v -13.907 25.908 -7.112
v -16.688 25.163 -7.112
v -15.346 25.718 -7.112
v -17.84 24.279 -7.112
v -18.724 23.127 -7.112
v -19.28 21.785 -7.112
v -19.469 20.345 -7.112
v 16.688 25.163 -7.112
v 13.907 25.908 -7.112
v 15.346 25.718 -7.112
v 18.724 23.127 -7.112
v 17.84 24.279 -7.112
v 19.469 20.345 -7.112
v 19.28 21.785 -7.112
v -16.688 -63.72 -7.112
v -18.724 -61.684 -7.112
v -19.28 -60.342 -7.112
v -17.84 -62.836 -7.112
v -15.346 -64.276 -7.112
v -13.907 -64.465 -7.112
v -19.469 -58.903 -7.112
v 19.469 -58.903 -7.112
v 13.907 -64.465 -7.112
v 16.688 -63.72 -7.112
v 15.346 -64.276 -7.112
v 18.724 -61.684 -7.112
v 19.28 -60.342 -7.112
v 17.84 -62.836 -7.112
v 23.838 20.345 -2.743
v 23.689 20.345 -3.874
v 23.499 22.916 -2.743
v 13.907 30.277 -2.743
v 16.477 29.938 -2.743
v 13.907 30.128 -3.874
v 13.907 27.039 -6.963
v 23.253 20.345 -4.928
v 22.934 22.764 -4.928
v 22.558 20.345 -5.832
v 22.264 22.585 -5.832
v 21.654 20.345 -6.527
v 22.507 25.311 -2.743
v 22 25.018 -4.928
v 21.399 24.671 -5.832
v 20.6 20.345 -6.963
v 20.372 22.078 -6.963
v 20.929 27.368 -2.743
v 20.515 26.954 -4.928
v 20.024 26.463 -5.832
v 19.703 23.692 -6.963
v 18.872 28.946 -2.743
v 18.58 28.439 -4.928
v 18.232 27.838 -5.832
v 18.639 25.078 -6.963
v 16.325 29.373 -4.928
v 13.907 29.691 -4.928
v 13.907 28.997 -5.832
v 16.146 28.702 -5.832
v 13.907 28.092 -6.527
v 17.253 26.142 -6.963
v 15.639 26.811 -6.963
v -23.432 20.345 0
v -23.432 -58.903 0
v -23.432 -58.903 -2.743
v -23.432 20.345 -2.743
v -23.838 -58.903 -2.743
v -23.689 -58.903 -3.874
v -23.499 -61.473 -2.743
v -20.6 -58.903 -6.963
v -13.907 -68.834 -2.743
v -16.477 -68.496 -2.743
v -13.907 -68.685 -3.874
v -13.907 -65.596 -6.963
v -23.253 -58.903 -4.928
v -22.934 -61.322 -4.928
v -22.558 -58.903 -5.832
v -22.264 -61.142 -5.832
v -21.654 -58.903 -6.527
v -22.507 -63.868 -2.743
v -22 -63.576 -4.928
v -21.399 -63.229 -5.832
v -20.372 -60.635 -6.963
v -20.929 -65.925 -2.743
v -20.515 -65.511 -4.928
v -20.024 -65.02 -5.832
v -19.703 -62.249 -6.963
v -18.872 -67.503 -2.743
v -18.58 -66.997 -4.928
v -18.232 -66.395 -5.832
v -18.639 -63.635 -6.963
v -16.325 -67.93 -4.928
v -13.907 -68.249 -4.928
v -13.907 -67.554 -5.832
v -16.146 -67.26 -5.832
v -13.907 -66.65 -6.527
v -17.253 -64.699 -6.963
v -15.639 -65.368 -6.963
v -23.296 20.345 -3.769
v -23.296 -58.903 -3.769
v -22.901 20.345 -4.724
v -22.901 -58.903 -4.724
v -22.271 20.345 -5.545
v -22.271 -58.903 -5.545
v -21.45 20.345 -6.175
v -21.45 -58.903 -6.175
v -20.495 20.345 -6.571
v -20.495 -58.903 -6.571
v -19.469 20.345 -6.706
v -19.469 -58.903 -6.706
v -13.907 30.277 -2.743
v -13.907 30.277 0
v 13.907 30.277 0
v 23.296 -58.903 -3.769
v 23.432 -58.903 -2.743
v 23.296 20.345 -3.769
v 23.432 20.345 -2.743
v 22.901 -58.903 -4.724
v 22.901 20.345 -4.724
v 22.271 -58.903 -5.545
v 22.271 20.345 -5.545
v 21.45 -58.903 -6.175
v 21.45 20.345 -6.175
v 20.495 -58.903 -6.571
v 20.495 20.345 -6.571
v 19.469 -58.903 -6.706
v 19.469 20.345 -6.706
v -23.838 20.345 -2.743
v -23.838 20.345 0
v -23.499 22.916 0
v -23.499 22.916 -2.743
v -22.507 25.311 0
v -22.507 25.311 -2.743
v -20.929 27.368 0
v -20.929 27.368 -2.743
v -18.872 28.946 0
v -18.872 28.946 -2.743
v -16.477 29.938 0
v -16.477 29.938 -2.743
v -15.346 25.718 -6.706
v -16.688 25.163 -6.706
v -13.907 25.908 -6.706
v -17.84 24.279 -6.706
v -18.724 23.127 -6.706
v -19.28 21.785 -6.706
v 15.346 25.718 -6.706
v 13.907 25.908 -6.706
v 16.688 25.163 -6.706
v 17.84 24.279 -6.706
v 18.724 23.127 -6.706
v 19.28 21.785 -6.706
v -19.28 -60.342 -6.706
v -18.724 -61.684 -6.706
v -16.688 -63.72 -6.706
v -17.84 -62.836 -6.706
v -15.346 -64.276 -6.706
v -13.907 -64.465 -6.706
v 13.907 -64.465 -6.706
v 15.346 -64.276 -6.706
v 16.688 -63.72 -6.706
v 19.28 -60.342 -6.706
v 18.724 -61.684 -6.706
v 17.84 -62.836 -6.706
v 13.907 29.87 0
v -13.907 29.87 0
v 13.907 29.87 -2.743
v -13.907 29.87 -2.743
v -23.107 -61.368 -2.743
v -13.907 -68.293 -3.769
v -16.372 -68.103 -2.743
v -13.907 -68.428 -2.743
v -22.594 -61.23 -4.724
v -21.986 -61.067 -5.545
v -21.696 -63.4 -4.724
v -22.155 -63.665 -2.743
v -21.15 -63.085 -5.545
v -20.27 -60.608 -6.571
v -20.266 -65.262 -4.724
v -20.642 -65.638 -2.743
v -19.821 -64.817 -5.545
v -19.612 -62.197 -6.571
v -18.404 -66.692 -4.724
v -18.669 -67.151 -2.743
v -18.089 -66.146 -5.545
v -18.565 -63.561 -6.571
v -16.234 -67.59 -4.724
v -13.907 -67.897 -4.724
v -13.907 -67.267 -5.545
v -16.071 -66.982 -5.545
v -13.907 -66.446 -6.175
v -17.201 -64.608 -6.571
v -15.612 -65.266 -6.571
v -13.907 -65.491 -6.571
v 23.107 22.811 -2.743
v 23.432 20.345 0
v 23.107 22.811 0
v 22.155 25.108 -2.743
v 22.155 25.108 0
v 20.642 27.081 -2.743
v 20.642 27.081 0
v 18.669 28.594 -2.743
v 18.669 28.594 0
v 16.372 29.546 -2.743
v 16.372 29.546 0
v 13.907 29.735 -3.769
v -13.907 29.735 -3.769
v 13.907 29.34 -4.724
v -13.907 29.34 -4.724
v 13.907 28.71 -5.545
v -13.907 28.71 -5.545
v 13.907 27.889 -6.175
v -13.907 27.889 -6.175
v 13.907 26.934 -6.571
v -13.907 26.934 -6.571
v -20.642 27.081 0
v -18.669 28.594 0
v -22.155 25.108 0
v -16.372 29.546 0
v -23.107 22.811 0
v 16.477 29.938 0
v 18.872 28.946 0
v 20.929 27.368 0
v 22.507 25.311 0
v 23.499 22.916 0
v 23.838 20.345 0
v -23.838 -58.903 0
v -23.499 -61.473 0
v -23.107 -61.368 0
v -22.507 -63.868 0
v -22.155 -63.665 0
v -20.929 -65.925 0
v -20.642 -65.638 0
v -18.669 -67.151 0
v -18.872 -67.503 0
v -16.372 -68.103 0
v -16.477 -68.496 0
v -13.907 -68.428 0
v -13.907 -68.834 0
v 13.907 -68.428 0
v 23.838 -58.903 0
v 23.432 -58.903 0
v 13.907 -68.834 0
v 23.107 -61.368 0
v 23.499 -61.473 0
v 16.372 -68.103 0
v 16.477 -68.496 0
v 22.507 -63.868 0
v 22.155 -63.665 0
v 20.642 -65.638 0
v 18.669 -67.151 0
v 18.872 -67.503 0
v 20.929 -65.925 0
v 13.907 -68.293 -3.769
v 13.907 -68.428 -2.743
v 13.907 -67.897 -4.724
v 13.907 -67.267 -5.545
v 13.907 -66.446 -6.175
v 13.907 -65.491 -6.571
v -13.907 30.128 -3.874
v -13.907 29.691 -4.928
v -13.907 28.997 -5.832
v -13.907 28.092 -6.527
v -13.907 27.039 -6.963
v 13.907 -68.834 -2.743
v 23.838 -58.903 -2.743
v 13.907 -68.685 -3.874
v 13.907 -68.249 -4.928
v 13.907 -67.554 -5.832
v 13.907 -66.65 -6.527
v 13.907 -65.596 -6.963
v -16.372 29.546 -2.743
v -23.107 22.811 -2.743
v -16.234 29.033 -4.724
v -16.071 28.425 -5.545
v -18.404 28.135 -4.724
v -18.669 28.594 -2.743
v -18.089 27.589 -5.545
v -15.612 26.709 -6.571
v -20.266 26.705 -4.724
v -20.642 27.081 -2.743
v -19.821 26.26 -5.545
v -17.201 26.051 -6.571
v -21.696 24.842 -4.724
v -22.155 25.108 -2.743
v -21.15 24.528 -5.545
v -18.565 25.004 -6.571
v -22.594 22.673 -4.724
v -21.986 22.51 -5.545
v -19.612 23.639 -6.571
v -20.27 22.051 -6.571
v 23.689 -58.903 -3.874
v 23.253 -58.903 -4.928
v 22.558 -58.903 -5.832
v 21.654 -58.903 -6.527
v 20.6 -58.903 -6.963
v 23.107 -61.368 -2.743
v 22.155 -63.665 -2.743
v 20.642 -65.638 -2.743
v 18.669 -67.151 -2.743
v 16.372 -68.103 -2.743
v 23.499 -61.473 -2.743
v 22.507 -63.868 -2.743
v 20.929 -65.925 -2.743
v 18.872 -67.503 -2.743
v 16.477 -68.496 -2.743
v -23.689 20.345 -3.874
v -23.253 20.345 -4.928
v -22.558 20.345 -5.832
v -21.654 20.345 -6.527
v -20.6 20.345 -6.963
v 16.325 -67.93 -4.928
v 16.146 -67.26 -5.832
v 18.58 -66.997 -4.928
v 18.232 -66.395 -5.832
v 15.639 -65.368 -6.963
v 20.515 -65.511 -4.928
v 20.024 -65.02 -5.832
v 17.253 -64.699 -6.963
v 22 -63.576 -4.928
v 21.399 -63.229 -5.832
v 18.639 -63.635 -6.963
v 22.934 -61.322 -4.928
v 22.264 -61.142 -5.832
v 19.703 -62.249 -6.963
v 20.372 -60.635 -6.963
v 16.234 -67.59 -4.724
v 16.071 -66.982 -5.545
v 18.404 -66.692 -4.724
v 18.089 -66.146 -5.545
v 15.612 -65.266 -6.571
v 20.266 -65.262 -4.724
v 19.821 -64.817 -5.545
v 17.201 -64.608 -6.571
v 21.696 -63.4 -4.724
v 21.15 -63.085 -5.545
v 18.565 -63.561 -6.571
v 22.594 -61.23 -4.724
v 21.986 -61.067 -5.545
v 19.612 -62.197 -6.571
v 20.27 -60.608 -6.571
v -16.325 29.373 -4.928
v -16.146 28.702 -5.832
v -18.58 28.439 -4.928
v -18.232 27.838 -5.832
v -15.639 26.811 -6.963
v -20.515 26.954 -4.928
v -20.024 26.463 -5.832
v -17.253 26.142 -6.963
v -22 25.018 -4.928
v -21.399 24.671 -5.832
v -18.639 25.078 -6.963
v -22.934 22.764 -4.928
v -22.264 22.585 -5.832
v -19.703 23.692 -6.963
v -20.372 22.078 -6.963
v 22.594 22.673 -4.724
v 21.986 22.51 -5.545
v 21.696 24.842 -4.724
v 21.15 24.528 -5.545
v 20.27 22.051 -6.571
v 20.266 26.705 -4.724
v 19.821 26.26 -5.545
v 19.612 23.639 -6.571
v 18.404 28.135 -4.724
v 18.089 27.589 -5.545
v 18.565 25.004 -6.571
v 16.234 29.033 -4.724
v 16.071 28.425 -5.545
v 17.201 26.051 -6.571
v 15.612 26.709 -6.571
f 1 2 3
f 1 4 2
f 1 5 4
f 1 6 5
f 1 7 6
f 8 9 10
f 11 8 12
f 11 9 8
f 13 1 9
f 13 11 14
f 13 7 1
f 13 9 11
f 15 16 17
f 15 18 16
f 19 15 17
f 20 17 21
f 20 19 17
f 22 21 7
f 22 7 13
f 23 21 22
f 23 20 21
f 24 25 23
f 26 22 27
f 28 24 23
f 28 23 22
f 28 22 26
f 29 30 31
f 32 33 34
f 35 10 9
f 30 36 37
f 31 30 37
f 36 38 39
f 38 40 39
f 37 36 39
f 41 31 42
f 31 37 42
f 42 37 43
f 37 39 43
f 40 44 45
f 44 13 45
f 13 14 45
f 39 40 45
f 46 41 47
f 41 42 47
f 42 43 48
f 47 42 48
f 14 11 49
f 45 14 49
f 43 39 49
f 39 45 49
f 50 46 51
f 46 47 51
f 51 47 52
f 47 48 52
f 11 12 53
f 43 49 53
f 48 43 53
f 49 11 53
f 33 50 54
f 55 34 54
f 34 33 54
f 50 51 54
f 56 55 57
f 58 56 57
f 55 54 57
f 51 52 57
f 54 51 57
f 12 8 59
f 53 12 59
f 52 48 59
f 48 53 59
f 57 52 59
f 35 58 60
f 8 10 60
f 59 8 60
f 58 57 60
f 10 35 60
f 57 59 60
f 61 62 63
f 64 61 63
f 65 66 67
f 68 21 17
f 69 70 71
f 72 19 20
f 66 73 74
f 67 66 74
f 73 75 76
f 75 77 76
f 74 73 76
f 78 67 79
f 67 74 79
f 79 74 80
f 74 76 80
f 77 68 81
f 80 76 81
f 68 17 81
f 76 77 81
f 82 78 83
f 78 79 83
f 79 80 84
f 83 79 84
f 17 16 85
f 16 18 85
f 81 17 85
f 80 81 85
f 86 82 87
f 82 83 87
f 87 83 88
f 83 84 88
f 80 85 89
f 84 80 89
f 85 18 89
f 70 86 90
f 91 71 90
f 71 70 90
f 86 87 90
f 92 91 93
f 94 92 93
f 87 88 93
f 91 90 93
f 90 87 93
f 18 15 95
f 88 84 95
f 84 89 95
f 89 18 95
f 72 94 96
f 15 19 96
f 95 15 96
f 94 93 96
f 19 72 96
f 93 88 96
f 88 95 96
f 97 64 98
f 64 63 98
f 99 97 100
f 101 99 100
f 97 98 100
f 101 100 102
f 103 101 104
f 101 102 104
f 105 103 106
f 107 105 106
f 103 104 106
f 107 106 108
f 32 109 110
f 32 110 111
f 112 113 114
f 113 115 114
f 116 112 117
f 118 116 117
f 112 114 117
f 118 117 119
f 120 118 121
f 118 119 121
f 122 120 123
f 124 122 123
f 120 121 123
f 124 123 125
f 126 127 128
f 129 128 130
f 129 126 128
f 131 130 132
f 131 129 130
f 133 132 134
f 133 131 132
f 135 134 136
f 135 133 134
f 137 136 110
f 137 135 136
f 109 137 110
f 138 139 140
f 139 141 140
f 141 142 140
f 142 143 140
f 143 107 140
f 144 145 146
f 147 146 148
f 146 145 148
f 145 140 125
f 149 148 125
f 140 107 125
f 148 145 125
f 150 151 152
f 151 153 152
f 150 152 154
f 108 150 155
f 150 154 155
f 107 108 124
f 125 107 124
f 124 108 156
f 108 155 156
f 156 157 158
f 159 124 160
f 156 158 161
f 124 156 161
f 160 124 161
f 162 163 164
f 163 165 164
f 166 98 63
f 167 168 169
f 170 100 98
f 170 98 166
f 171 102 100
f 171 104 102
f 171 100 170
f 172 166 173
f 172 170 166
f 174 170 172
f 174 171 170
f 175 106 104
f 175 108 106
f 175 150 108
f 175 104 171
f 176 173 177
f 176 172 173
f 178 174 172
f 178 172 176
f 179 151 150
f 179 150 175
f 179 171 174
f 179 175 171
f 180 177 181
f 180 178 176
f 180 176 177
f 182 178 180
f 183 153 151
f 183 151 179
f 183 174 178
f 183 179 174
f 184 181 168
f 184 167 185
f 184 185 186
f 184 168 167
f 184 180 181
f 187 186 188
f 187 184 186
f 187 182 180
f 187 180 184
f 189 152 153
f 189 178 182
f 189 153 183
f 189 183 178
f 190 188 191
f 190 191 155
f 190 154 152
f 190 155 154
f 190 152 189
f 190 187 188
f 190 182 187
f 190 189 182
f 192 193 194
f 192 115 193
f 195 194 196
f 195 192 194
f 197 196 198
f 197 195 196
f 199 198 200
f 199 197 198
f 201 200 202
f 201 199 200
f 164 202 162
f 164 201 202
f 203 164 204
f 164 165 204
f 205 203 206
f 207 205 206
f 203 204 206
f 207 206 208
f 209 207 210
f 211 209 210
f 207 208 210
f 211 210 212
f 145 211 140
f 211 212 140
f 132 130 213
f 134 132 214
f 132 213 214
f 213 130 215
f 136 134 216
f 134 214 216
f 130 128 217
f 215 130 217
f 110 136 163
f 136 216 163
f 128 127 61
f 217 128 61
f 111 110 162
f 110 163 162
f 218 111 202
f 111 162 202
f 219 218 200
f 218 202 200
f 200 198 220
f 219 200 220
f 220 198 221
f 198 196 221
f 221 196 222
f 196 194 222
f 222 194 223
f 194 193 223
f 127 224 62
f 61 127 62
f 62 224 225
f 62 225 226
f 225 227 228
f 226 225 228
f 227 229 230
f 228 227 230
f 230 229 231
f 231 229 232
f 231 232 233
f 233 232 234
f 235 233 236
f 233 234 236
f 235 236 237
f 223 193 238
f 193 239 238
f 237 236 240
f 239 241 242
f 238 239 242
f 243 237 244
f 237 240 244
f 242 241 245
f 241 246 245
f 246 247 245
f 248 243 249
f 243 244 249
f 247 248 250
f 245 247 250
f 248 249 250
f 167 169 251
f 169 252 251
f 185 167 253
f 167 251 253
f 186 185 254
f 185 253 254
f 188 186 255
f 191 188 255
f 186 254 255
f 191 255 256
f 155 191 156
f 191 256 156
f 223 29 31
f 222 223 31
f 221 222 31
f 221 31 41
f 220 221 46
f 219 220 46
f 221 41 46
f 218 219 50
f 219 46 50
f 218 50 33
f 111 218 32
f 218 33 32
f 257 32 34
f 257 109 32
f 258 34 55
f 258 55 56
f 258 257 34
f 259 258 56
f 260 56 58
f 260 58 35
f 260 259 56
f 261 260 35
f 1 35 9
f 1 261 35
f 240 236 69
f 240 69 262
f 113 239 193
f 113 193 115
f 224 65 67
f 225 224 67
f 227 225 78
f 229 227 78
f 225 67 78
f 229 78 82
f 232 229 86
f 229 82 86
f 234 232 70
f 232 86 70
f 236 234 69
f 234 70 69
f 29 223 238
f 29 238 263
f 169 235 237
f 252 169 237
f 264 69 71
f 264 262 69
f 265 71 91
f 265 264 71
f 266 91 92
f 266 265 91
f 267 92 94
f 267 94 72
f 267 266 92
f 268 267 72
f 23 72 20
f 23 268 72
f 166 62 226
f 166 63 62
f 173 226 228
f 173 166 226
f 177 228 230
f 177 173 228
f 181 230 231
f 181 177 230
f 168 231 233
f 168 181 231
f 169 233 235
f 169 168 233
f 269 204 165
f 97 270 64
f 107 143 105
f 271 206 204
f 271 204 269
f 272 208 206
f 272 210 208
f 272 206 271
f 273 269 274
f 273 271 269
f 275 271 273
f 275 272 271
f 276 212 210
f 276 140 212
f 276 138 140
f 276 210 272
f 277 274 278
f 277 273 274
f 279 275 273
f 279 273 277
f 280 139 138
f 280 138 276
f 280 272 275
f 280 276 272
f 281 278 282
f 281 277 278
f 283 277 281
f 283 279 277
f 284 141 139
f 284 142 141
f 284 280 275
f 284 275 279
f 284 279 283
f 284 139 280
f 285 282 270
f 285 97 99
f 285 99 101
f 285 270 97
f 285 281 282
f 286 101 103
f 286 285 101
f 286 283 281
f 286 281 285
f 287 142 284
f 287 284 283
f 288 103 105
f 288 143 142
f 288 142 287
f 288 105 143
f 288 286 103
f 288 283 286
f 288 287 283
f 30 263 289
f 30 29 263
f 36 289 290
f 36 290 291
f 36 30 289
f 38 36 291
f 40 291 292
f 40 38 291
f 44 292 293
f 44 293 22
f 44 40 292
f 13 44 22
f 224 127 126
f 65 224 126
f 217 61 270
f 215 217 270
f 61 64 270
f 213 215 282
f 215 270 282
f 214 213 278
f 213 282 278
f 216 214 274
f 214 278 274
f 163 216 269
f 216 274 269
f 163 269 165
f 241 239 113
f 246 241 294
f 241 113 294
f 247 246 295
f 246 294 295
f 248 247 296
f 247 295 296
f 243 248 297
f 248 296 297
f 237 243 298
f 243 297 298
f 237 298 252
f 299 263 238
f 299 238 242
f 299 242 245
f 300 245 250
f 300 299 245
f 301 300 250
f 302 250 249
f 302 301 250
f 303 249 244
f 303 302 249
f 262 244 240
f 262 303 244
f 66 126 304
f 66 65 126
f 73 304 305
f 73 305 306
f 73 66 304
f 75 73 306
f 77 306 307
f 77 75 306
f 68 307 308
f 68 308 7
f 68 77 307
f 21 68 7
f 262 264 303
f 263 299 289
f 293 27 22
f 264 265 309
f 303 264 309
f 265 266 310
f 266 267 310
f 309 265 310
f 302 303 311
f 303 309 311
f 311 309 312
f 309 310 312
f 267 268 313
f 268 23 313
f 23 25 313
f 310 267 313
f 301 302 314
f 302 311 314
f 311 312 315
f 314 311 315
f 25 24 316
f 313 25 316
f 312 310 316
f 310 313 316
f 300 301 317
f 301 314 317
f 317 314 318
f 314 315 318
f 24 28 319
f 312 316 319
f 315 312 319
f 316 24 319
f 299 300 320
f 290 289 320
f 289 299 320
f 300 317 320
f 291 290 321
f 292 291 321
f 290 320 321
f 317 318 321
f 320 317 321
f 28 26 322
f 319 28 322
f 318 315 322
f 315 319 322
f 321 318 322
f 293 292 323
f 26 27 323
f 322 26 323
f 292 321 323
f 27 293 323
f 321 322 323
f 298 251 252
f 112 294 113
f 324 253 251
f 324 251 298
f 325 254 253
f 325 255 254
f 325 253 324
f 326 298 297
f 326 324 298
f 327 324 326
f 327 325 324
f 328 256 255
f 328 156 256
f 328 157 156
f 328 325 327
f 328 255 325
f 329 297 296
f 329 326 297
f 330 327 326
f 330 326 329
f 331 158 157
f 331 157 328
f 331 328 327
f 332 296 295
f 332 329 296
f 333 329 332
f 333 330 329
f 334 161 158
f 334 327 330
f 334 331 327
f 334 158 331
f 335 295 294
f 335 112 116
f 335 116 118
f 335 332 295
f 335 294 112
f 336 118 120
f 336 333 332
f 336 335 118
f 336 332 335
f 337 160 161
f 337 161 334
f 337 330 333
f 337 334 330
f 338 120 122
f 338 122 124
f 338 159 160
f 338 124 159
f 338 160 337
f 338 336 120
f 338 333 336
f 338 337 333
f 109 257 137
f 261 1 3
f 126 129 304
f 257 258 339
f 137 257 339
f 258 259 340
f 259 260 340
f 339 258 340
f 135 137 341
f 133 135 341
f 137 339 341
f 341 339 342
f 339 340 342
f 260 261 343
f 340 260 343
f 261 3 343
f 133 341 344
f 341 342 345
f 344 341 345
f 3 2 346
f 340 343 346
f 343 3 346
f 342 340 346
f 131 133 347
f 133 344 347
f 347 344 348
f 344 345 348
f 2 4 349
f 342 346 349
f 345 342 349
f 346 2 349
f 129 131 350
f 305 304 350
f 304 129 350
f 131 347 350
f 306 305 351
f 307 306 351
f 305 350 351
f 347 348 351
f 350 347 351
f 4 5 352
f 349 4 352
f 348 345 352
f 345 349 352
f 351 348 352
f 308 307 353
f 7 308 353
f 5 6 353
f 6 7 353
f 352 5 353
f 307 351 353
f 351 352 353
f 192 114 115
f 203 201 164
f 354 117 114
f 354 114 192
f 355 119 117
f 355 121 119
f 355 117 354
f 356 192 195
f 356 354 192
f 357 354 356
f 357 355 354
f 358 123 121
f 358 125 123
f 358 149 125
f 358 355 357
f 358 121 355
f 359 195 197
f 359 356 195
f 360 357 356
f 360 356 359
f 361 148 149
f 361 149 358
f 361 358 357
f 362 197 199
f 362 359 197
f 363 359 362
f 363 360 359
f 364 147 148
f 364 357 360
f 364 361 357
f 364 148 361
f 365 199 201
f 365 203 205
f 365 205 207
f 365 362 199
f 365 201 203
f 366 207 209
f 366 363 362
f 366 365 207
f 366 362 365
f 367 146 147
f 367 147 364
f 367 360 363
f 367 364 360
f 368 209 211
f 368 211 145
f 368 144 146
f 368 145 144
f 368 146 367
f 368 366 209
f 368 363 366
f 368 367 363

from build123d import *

# Parameters (mm, degrees)
SKETCH1_W           = 47.6758
SKETCH1_H           = 68.834
BOSS_EXTRUDE1_DEPTH = 7.112
SKETCH11_W          = 47.6758
SKETCH11_H          = 7.112
BOSS_EXTRUDE2_DEPTH = 30.2768
FILLET3_R           = 9.9314
FILLET6_R           = 4.3688
SHELL1_T            = -0.4064


with BuildPart() as part:
    # Sketch1 → Boss-Extrude1 (new body)
    with BuildSketch(Plane.XY):
        with Locations((0, -34.417)):
            Rectangle(SKETCH1_W, SKETCH1_H)
    extrude(amount=-BOSS_EXTRUDE1_DEPTH)

    # Sketch11 → Boss-Extrude2 (add)
    with BuildSketch(Plane(origin=(0, 0, 0), x_dir=(1, 0, 0), z_dir=(0, 1, 0))):
        with Locations((0, 3.556)):
            Rectangle(SKETCH11_W, SKETCH11_H)
    extrude(amount=BOSS_EXTRUDE2_DEPTH)

    # Fillet3
    fillet3_edges = [part.edges().sort_by_distance(p)[0] for p in [
        (-23.8379, 30.2768, -3.556),
        (23.8379, 30.2768, -3.556),
        (23.8379, -68.834, -3.556),
        (-23.8379, -68.834, -3.556),
    ]]
    fillet(fillet3_edges, radius=FILLET3_R)

    # Fillet6
    fillet6_edges = [part.edges().sort_by_distance(p)[0] for p in [
        (-23.8379, -19.2786, -7.112),
        (-20.929060287, -65.925160287, -7.112),
        (0, -68.834, -7.112),
        (23.8379, -19.2786, -7.112),
        (-20.929060287, 27.367960287, -7.112),
        (0, 30.2768, -7.112),
        (20.929060287, 27.367960287, -7.112),
    ]]
    fillet(fillet6_edges, radius=FILLET6_R)

    # Shell1
    shell1_openings = [part.faces().sort_by_distance(p)[0] for p in [
        (0, -19.2786, 0),
    ]]
    offset(amount=SHELL1_T, openings=shell1_openings, kind=Kind.INTERSECTION)


solid = part.part
